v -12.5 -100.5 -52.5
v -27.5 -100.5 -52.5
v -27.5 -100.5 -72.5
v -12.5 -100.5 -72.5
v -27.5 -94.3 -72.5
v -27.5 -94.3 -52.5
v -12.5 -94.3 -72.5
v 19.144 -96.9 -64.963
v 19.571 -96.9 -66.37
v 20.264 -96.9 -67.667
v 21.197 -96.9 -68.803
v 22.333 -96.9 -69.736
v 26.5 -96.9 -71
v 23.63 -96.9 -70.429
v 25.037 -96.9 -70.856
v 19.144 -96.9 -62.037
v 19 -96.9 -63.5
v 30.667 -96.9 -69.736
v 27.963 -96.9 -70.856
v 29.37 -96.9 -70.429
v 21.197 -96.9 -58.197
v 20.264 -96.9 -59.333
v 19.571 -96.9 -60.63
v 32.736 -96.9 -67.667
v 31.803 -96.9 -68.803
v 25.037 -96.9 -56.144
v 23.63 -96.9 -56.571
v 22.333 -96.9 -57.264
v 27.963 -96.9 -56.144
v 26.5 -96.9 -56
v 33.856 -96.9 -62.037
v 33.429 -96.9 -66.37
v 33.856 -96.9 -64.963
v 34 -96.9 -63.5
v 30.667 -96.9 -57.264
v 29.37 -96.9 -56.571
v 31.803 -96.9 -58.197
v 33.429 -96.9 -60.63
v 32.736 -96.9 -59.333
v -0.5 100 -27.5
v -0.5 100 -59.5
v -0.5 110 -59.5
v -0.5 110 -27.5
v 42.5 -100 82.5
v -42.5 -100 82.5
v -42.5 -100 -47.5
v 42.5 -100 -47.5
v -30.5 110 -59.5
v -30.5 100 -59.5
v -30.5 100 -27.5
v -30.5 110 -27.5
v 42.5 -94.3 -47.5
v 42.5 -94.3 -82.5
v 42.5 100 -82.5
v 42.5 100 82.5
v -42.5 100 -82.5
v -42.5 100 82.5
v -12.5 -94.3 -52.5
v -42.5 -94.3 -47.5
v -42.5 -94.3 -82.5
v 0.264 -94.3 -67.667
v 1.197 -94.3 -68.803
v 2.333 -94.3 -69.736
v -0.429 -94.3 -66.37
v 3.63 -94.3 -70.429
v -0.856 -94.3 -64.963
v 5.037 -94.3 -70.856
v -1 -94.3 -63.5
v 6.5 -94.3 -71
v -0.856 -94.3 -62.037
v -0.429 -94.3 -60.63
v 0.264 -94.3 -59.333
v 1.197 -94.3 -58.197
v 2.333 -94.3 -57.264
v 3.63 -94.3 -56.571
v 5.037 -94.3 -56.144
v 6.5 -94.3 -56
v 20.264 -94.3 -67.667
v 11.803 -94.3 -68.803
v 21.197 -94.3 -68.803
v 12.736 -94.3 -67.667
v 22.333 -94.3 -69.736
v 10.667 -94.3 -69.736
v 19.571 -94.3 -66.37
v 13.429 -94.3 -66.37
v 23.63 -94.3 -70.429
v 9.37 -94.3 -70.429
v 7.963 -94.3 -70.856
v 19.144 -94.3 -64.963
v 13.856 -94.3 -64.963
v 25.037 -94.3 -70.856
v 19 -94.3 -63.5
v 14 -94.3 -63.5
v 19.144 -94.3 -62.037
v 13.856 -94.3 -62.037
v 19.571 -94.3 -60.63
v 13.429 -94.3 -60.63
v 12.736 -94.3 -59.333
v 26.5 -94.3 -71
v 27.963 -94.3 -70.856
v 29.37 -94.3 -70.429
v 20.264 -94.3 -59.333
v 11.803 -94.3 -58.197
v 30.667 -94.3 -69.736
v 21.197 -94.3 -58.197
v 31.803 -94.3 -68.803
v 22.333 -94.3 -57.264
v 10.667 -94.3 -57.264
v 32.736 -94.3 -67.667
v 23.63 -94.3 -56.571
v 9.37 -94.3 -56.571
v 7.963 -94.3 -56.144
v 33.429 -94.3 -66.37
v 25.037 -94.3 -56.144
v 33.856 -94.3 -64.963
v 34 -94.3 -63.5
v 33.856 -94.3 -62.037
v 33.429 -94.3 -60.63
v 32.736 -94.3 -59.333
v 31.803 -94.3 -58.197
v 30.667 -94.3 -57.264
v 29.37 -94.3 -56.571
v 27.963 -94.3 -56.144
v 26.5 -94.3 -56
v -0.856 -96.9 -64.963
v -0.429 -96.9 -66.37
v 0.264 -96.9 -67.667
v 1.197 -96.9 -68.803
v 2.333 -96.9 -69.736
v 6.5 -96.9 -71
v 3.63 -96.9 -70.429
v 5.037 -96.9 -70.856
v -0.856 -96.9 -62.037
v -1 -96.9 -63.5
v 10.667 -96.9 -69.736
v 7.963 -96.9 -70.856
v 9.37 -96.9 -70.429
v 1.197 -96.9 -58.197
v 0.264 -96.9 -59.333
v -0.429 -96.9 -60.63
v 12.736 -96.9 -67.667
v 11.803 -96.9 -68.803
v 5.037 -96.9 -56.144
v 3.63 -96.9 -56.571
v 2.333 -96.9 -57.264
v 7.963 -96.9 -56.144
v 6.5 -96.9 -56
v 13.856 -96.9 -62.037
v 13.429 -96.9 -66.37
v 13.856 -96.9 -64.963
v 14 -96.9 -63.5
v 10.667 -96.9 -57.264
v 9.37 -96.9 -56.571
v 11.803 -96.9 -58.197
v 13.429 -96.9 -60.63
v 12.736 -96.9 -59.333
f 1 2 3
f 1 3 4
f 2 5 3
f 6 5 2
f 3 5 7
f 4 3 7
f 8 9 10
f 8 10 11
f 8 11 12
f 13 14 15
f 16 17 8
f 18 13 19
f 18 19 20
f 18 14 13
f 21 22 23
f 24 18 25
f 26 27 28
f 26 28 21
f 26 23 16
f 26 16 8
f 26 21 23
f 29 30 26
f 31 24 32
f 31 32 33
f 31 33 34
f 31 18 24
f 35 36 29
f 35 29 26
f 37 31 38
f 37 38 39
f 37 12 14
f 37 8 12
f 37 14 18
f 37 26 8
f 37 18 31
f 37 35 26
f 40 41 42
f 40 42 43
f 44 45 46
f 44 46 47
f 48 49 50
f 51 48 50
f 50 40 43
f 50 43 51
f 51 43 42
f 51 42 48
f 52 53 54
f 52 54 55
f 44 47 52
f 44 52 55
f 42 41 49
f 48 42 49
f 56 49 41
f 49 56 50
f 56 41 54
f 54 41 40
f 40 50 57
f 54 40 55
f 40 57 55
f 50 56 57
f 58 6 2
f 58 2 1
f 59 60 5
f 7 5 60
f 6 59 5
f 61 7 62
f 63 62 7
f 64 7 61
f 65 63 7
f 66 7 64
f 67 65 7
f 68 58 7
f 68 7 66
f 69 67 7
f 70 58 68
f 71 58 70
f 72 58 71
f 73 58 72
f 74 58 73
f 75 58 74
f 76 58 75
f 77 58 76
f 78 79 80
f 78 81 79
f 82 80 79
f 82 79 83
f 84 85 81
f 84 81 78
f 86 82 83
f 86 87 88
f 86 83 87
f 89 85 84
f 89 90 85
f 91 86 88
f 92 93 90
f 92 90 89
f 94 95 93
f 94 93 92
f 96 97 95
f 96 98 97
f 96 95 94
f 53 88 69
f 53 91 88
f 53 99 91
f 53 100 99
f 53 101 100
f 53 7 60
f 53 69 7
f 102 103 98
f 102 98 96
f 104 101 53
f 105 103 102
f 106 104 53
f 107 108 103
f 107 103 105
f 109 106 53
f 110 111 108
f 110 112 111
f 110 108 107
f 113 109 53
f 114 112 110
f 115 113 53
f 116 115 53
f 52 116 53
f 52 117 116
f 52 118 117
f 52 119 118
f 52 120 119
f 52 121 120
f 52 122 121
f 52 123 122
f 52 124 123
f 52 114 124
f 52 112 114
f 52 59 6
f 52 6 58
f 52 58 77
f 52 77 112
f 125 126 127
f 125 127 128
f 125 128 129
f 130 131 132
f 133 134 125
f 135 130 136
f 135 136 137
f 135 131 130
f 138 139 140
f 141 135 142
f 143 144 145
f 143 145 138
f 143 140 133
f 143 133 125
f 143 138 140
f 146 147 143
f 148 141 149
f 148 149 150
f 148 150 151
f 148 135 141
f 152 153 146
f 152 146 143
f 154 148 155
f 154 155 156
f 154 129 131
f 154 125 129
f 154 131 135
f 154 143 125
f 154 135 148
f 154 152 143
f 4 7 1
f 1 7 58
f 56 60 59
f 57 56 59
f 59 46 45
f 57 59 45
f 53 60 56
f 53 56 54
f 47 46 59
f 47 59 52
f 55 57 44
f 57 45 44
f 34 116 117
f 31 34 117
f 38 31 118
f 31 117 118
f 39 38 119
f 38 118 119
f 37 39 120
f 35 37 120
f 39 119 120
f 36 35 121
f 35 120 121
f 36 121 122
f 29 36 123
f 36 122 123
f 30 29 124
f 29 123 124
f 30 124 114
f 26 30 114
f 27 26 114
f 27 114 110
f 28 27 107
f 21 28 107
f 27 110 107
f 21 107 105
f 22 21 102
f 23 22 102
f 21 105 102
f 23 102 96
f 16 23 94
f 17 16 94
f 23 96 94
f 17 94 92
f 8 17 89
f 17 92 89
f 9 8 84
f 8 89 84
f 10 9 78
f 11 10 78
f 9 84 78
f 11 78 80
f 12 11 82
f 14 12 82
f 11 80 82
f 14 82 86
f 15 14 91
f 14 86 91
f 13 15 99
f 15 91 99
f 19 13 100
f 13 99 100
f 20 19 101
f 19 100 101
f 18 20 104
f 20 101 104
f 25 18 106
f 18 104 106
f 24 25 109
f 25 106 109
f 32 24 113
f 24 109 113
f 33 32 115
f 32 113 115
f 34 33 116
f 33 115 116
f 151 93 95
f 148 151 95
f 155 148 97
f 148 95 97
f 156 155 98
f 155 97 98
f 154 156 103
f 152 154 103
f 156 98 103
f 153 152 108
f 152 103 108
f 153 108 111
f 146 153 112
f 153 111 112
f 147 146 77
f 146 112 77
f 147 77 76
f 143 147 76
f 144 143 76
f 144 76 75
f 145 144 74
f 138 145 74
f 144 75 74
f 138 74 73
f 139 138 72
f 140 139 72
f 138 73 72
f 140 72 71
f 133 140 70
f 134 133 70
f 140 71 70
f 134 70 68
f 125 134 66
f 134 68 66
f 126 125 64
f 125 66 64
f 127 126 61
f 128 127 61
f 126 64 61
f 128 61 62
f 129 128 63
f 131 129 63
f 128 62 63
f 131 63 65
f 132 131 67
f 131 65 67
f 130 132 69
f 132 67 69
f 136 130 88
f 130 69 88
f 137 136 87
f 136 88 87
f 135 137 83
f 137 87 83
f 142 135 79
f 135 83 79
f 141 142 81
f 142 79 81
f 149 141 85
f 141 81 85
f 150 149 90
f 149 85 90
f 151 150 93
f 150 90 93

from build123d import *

# Parameters (mm, degrees)
F0_W     = 85
F0_H     = 165
F1_DEPTH = 100
F2_W     = 30
F2_H     = 32
F3_DEPTH = 10
F4_W     = 85
F4_H     = 35
F5_DEPTH = 5.7
F6_R     = 7.5
F7_DEPTH = 2.6
F8_W     = 15
F8_H     = 20
F9_DEPTH = 6.2


with BuildPart() as f1:
    # F0 (on Front) → F1 (new body, symmetric)
    with BuildSketch(Plane.XZ):
        Rectangle(F0_W, F0_H)
    extrude(amount=F1_DEPTH, both=True)

    # F2 (on face) → F3 (join)
    with BuildSketch(Plane(origin=(0, 100, 0), x_dir=(-1, 0, 0), z_dir=(0, 1, 0))):
        with Locations((15.5, -43.5)):
            Rectangle(F2_W, F2_H)
    extrude(amount=F3_DEPTH)

    # F4 (on face) → F5 (cut)
    with BuildSketch(Plane.XZ.offset(100)):
        with Locations((0, -65)):
            Rectangle(F4_W, F4_H)
    extrude(amount=-F5_DEPTH, mode=Mode.SUBTRACT)

    # F6 (on face) → F7 (join)
    with BuildSketch(Plane.XZ.offset(94.3)):
        with Locations((6.5, -63.5)):
            Circle(F6_R)
        with Locations((26.5, -63.5)):
            Circle(F6_R)
    extrude(amount=F7_DEPTH)

    # F8 (on face) → F9 (join)
    with BuildSketch(Plane.XZ.offset(94.3)):
        with Locations((-20, -62.5)):
            Rectangle(F8_W, F8_H)
    extrude(amount=F9_DEPTH)


solid = f1.part
